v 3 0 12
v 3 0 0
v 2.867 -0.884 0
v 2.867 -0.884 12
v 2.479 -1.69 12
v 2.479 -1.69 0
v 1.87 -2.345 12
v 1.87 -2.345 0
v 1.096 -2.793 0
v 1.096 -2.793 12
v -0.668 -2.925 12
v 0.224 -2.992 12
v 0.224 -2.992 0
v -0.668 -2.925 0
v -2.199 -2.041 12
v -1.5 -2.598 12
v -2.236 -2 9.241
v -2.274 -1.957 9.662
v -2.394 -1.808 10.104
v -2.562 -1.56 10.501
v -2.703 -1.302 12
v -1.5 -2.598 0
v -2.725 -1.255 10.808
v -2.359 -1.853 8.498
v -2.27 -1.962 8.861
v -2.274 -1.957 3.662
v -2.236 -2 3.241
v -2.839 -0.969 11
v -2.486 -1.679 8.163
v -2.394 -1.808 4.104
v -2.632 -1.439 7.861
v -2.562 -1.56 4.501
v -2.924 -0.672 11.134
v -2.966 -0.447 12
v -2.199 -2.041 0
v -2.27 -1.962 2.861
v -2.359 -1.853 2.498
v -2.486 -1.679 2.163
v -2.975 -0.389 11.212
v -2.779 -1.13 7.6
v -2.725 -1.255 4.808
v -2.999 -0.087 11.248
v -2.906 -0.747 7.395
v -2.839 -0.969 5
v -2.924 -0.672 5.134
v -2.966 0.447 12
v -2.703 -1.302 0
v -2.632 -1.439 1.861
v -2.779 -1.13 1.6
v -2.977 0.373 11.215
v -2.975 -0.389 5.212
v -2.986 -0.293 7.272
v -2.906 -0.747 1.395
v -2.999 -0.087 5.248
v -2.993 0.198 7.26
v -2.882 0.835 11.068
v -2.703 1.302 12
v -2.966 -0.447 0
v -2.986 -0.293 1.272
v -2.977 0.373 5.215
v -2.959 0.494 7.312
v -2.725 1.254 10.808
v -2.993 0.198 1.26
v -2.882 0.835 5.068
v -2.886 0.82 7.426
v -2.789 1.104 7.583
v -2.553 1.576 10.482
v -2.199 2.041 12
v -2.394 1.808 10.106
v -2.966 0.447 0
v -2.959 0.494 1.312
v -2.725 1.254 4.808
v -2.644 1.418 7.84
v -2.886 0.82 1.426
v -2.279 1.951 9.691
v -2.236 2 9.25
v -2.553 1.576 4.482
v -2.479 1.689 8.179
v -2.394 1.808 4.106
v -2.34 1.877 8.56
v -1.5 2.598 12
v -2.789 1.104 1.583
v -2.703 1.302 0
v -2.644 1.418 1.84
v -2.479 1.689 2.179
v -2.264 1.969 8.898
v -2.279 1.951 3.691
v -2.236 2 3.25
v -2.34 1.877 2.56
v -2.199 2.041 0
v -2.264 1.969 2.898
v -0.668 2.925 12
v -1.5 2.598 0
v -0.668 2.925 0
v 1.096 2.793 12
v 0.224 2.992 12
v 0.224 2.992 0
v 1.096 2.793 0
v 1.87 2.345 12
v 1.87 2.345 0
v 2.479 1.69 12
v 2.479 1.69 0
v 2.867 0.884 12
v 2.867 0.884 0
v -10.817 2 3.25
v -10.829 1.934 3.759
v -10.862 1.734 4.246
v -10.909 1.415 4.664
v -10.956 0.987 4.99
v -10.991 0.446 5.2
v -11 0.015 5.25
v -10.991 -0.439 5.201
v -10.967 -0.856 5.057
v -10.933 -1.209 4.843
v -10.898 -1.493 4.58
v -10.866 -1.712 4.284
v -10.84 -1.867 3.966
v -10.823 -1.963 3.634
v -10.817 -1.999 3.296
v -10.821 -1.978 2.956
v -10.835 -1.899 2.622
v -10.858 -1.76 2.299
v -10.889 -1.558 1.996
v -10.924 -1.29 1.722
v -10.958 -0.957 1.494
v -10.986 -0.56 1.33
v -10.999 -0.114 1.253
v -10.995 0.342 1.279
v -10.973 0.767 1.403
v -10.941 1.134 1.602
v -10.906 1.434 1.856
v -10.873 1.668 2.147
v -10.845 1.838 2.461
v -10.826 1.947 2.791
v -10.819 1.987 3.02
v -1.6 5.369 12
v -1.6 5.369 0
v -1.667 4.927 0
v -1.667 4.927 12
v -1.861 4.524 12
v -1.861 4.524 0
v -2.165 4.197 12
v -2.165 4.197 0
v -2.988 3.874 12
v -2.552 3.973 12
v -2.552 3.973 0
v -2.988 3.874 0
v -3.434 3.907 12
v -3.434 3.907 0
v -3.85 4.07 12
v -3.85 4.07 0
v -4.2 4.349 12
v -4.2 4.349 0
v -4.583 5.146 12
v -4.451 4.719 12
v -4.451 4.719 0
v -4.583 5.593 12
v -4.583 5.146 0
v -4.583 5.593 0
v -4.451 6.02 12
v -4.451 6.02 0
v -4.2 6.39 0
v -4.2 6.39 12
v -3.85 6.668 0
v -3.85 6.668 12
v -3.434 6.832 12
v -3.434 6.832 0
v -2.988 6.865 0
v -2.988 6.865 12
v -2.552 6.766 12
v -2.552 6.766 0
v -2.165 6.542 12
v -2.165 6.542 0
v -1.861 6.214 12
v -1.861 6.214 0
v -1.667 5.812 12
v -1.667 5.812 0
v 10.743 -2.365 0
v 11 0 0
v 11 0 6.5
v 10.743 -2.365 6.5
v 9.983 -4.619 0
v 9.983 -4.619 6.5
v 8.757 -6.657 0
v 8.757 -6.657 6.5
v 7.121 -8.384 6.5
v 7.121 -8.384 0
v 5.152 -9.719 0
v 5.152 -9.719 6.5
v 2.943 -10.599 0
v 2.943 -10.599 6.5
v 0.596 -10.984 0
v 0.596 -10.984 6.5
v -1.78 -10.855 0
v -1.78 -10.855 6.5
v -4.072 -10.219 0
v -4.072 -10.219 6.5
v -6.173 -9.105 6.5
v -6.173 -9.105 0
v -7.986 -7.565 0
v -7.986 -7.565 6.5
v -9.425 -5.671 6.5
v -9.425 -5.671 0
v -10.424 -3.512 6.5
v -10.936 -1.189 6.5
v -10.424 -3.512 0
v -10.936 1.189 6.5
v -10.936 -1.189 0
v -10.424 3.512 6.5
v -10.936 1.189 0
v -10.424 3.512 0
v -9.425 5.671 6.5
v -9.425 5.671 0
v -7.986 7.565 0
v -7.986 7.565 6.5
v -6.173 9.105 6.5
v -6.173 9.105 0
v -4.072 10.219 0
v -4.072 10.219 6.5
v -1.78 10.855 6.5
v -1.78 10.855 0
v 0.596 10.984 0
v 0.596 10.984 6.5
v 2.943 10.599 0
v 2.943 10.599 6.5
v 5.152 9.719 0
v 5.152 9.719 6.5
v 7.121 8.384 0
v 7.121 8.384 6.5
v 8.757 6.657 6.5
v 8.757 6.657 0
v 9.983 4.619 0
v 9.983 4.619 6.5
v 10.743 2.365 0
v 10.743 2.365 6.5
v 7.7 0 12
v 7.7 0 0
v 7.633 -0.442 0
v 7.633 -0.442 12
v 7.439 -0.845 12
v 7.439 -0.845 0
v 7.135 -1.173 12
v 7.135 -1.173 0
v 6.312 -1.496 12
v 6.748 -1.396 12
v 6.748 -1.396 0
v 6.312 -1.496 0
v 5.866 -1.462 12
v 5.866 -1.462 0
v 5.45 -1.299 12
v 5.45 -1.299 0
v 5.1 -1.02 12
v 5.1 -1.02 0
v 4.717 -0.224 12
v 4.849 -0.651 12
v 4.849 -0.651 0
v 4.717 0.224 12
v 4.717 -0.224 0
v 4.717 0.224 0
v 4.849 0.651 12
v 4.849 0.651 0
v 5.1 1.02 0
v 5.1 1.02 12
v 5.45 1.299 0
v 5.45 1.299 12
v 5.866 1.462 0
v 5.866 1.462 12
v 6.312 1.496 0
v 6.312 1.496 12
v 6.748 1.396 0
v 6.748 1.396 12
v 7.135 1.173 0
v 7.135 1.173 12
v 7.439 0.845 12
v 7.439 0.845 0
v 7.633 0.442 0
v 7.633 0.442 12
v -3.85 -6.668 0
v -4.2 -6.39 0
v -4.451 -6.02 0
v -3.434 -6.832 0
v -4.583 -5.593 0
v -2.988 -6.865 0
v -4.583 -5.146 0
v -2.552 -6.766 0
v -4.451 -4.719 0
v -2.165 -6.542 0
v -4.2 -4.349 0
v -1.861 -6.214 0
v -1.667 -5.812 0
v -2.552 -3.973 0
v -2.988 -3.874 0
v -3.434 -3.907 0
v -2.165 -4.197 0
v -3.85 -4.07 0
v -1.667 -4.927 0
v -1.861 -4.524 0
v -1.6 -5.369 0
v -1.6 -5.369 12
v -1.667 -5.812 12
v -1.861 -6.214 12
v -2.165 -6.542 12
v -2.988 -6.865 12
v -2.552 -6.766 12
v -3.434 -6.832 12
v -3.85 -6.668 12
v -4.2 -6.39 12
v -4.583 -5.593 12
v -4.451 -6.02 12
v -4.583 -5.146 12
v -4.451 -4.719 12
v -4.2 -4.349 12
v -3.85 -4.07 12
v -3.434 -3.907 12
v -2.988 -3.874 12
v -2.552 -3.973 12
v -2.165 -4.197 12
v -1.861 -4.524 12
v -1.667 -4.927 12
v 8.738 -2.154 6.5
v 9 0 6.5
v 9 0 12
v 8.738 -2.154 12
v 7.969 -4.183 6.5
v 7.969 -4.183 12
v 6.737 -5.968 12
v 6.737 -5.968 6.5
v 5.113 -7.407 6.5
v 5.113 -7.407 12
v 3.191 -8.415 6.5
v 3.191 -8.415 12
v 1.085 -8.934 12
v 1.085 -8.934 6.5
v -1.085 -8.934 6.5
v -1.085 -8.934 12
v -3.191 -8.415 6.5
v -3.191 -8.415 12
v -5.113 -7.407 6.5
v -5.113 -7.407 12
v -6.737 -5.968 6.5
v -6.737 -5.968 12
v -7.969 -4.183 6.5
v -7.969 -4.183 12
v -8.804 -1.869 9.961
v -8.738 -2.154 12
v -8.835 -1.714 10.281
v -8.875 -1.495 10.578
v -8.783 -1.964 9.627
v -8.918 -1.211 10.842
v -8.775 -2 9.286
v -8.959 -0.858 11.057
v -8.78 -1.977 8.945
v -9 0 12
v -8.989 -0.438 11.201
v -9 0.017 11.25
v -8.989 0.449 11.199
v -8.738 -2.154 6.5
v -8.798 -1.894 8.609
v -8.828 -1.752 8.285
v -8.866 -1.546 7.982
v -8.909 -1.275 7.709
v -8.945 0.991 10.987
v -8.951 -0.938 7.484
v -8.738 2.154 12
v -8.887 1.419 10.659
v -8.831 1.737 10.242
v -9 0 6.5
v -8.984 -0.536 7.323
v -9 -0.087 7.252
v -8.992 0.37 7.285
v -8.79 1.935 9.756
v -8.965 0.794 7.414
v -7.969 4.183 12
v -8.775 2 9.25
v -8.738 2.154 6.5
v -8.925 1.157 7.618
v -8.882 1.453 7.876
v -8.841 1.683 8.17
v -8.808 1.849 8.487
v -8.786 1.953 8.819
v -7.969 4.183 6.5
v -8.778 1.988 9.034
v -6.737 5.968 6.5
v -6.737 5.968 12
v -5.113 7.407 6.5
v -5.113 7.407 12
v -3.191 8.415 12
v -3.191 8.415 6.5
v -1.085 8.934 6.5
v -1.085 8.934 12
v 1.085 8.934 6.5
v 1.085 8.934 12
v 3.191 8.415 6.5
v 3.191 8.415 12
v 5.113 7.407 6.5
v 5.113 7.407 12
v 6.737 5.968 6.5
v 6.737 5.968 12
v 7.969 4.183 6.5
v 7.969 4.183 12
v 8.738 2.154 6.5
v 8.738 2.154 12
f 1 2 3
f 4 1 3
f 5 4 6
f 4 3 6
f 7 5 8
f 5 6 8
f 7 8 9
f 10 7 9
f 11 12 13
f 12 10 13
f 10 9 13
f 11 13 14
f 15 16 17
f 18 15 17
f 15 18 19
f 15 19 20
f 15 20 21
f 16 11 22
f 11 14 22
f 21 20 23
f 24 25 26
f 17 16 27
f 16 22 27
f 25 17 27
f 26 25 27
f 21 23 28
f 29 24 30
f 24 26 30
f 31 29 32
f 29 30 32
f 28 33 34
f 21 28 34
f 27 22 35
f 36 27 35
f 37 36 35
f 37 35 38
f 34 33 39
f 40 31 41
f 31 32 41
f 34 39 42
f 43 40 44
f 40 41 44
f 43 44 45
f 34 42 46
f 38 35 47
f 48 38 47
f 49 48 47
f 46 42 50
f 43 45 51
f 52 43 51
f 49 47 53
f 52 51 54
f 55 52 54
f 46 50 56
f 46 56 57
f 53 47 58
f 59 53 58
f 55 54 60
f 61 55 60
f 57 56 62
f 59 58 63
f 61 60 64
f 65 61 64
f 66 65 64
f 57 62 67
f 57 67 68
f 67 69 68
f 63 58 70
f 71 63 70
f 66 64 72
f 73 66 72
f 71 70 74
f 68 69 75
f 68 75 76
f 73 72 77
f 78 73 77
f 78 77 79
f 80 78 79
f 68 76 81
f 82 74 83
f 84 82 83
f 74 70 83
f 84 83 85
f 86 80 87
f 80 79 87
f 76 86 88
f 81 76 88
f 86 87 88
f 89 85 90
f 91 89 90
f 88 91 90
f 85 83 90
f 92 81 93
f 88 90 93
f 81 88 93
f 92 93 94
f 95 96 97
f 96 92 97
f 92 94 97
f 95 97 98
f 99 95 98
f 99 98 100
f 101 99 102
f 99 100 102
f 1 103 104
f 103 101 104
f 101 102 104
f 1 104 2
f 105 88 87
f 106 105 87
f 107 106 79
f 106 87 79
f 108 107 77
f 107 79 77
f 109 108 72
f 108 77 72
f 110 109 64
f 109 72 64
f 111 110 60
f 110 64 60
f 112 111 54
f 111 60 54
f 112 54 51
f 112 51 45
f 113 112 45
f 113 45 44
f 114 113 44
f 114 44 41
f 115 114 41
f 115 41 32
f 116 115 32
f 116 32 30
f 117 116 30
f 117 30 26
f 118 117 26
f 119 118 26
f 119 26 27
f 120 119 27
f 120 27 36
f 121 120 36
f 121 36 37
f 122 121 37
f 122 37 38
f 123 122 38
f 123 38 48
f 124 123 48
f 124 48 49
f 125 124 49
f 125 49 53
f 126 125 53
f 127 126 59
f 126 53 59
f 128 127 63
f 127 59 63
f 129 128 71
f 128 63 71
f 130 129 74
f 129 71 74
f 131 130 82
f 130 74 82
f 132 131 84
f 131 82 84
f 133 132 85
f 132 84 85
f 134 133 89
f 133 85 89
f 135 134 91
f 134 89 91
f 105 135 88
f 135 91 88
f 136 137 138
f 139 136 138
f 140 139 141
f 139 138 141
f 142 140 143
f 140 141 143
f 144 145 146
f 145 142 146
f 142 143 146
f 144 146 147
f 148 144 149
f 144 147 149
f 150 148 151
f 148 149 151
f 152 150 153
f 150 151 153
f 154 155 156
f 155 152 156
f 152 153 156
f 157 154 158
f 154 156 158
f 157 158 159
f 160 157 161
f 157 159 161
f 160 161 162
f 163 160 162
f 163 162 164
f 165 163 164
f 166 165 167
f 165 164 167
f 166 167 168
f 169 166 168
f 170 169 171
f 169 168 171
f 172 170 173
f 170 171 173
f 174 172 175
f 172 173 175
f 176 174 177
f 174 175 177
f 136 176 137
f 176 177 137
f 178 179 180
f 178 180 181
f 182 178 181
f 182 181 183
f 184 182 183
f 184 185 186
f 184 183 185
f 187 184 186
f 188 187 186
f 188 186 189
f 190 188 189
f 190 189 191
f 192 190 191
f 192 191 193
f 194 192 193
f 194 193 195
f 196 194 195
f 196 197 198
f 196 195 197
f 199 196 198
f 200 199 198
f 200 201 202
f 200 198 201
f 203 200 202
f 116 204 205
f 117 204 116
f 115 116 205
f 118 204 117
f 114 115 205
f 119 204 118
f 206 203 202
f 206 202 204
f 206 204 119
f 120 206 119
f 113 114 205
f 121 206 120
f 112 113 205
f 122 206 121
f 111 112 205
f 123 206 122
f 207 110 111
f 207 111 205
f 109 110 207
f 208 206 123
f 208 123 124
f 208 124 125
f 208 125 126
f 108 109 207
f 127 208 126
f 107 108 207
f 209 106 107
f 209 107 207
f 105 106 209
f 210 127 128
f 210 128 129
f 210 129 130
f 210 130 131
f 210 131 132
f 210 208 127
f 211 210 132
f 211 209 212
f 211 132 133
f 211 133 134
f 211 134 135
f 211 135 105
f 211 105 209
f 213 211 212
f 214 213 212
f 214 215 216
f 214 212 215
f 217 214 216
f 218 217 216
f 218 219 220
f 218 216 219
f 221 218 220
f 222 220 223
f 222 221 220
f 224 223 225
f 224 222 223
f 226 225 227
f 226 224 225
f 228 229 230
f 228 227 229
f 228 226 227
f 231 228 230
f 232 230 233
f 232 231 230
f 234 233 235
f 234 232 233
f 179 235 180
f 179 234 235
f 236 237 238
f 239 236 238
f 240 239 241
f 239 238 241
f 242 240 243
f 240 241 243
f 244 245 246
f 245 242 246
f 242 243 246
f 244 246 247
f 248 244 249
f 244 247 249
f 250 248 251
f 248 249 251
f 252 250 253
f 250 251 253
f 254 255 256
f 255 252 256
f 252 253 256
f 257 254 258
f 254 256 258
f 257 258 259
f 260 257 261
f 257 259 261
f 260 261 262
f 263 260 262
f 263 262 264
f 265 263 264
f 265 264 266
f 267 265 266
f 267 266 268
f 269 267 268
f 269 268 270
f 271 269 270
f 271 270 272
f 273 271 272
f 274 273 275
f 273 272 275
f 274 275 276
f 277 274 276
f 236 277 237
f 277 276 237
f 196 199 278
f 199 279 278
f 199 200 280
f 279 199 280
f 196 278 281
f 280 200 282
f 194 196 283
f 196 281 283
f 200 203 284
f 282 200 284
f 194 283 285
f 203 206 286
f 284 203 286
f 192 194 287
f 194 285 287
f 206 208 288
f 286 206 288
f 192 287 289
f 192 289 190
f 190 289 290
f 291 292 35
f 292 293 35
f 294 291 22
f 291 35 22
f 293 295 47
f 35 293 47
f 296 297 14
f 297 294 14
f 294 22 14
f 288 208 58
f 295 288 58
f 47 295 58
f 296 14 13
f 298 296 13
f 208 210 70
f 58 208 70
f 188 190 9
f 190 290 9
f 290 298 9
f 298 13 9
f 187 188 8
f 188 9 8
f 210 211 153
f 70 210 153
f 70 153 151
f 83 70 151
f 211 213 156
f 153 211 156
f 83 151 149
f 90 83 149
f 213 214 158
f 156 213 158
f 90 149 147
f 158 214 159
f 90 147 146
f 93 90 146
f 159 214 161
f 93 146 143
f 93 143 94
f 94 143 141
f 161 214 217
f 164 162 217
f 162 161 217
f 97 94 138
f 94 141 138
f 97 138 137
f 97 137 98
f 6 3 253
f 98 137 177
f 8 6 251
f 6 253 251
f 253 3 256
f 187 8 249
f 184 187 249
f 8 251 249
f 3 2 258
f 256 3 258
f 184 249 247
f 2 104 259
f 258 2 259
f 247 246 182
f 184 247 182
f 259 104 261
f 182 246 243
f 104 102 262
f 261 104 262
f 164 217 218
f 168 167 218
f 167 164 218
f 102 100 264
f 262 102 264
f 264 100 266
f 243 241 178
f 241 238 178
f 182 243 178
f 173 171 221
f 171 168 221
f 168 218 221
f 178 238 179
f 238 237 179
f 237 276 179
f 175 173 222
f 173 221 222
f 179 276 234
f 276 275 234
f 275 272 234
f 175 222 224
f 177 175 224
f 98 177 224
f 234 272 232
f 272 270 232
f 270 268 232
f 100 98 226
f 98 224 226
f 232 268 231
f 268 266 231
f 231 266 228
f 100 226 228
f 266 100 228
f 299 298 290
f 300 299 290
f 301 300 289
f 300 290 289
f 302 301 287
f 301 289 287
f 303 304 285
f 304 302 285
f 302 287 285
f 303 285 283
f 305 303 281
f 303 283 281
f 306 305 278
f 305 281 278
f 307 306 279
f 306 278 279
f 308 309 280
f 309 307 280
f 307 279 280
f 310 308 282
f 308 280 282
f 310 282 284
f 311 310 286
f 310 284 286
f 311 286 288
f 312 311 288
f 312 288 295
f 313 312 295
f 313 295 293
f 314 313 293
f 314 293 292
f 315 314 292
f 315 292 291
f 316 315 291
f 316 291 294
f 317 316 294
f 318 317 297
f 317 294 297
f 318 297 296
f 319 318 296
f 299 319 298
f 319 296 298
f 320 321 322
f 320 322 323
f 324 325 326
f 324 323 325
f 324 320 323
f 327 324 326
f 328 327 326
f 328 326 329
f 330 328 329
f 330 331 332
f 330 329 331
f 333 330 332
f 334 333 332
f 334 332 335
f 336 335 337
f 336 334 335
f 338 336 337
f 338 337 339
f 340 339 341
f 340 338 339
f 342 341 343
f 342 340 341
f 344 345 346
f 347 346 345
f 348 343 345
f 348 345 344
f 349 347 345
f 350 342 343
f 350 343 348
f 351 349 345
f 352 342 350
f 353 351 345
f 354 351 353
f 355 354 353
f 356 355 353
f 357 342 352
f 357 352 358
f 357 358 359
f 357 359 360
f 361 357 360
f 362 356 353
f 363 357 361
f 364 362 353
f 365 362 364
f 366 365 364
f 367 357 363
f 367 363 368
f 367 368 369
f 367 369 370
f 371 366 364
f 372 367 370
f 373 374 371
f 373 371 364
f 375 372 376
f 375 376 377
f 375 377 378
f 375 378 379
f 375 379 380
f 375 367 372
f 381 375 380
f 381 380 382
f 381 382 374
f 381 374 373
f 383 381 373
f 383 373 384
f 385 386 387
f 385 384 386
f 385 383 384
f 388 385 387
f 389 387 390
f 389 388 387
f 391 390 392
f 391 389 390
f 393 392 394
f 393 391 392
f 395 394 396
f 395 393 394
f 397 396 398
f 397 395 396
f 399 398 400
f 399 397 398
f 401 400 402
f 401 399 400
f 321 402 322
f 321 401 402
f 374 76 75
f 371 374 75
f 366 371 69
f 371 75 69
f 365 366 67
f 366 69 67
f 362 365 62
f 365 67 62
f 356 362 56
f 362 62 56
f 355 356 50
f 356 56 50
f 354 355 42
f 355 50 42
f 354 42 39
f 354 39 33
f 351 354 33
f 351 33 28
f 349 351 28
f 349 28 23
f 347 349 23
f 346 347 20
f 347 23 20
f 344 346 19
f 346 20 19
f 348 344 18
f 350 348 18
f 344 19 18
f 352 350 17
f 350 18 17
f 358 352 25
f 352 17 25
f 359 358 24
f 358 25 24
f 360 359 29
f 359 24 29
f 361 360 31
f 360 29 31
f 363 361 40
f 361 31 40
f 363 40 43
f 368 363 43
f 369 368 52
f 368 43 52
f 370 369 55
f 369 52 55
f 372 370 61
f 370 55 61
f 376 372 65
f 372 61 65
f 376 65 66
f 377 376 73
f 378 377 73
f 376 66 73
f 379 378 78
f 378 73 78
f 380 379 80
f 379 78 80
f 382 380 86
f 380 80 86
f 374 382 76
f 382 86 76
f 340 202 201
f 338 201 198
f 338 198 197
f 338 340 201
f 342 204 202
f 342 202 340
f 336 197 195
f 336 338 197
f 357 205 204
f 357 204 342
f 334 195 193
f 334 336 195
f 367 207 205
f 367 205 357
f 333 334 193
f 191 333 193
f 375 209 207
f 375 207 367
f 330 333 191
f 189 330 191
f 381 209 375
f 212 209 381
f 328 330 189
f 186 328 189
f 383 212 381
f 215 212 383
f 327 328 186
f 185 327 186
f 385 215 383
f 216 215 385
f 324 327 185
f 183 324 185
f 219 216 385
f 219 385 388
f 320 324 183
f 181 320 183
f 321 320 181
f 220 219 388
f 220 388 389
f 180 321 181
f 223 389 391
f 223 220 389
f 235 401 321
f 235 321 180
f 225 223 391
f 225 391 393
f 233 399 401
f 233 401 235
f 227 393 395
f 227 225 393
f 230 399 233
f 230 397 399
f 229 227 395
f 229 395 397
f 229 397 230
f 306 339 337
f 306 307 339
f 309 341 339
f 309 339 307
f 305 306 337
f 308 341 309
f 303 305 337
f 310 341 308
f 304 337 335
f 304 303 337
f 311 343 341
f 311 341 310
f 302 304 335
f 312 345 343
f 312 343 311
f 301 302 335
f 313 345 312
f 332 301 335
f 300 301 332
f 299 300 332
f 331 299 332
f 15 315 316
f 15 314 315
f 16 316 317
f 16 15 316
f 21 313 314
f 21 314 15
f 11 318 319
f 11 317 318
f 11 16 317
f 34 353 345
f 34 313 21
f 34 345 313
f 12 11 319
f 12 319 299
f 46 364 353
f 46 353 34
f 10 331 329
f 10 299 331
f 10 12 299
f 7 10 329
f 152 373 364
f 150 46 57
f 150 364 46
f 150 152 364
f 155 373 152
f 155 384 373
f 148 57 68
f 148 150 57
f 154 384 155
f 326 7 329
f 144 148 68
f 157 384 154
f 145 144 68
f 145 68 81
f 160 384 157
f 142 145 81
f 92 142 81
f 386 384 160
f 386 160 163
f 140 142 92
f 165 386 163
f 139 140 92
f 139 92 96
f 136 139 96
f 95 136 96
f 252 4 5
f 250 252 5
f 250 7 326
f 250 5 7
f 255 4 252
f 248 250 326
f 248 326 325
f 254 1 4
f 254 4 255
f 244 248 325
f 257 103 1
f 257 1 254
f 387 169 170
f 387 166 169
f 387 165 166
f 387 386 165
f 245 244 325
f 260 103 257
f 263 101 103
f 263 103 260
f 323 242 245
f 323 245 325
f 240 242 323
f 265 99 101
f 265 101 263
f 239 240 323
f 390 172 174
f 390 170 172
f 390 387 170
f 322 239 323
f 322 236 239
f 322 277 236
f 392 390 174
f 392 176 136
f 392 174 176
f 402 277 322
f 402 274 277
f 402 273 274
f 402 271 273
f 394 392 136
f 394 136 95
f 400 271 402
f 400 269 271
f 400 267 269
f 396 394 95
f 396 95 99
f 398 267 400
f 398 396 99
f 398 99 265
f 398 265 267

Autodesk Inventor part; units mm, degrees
ref_plane "YZ Plane" through (0, 0, 0) normal (1, 0, 0) x (0, 1, 0)
ref_plane "XZ Plane" through (0, 0, 0) normal (0, 1, 0) x (-1, 0, 0)
ref_plane "XY Plane" through (0, 0, 0) normal (0, 0, 1) x (1, 0, 0)
sketch "Sketch3" plane through (0, 0, 0) normal (0, 0, 1) x (1, 0, 0)
  circle A0 centre (0, 0) radius 11
  circle A1 centre (0, 0) radius 3
  circle A2 centre (6.2, 0) radius 1.5
  circle A3 centre (3.1, 5.3694) radius 1.5
  circle A4 centre (-3.1, 5.3694) radius 1.5
  circle A5 centre (-6.2, 0) radius 1.5
  circle A6 centre (-3.1, -5.3694) radius 1.5
  circle A7 centre (3.1, -5.3694) radius 1.5
  dimension "d0" = 22
  dimension "d1" = 6
  dimension "d4" = 3
  dimension "d5" = 6.2
  dimension "d12" = 360
extrude "Extrusion1" add sketch "Sketch3" along normal blind 6.5 contours A0 | A3 | A5 | A7
sketch "Sketch6" plane through (0, 0, 6.5) normal (0, 0, 1) x (1, 0, 0)
  circle A0 centre (0, 0) radius 3 projected
  circle A1 centre (-3.1, -5.3694) radius 1.5 projected
  circle A2 centre (-3.1, 5.3694) radius 1.5 projected
  circle A3 centre (6.2, 0) radius 1.5 projected
  circle A4 centre (0, 0) radius 11 projected
  circle A5 centre (0, 0) radius 9
  dimension "d27" = 18
extrude "Extrusion4" add sketch "Sketch6" along normal blind 5.5 contours A5
sketch "Sketch7" plane through (0, 0, 0) normal (1, 0, 0) x (0, 1, 0)
  circle A0 centre (0, 3.25) radius 2
  circle A1 centre (0, 9.25) radius 2
  line L0 (11, 0) -> (11, 6.5) projected
  line L1 (9, 6.5) -> (9, 12) projected
  point P0 (0, 0)
  point P1 (11, 3.25)
  point P2 (9, 9.25)
  dimension "d30" = 4
  dimension "d31" = 4
extrude "Extrusion5" cut sketch "Sketch7" against normal through all
thread "Thread5" size "M4x0.7" class "6H" standard "ANSI Metric M Profile" full length
thread "Thread6" size "M4x0.7" class "6H" standard "ANSI Metric M Profile" full length
thread "Thread7" size "M3x0.5" class "6H" standard "ANSI Metric M Profile" full length
thread "Thread8" size "M3x0.5" class "6H" standard "ANSI Metric M Profile" full length
thread "Thread9" size "M3x0.5" class "6H" standard "ANSI Metric M Profile" full length
properties part number "6mm Mounting Hub, thin" material "ABS Plastic"
